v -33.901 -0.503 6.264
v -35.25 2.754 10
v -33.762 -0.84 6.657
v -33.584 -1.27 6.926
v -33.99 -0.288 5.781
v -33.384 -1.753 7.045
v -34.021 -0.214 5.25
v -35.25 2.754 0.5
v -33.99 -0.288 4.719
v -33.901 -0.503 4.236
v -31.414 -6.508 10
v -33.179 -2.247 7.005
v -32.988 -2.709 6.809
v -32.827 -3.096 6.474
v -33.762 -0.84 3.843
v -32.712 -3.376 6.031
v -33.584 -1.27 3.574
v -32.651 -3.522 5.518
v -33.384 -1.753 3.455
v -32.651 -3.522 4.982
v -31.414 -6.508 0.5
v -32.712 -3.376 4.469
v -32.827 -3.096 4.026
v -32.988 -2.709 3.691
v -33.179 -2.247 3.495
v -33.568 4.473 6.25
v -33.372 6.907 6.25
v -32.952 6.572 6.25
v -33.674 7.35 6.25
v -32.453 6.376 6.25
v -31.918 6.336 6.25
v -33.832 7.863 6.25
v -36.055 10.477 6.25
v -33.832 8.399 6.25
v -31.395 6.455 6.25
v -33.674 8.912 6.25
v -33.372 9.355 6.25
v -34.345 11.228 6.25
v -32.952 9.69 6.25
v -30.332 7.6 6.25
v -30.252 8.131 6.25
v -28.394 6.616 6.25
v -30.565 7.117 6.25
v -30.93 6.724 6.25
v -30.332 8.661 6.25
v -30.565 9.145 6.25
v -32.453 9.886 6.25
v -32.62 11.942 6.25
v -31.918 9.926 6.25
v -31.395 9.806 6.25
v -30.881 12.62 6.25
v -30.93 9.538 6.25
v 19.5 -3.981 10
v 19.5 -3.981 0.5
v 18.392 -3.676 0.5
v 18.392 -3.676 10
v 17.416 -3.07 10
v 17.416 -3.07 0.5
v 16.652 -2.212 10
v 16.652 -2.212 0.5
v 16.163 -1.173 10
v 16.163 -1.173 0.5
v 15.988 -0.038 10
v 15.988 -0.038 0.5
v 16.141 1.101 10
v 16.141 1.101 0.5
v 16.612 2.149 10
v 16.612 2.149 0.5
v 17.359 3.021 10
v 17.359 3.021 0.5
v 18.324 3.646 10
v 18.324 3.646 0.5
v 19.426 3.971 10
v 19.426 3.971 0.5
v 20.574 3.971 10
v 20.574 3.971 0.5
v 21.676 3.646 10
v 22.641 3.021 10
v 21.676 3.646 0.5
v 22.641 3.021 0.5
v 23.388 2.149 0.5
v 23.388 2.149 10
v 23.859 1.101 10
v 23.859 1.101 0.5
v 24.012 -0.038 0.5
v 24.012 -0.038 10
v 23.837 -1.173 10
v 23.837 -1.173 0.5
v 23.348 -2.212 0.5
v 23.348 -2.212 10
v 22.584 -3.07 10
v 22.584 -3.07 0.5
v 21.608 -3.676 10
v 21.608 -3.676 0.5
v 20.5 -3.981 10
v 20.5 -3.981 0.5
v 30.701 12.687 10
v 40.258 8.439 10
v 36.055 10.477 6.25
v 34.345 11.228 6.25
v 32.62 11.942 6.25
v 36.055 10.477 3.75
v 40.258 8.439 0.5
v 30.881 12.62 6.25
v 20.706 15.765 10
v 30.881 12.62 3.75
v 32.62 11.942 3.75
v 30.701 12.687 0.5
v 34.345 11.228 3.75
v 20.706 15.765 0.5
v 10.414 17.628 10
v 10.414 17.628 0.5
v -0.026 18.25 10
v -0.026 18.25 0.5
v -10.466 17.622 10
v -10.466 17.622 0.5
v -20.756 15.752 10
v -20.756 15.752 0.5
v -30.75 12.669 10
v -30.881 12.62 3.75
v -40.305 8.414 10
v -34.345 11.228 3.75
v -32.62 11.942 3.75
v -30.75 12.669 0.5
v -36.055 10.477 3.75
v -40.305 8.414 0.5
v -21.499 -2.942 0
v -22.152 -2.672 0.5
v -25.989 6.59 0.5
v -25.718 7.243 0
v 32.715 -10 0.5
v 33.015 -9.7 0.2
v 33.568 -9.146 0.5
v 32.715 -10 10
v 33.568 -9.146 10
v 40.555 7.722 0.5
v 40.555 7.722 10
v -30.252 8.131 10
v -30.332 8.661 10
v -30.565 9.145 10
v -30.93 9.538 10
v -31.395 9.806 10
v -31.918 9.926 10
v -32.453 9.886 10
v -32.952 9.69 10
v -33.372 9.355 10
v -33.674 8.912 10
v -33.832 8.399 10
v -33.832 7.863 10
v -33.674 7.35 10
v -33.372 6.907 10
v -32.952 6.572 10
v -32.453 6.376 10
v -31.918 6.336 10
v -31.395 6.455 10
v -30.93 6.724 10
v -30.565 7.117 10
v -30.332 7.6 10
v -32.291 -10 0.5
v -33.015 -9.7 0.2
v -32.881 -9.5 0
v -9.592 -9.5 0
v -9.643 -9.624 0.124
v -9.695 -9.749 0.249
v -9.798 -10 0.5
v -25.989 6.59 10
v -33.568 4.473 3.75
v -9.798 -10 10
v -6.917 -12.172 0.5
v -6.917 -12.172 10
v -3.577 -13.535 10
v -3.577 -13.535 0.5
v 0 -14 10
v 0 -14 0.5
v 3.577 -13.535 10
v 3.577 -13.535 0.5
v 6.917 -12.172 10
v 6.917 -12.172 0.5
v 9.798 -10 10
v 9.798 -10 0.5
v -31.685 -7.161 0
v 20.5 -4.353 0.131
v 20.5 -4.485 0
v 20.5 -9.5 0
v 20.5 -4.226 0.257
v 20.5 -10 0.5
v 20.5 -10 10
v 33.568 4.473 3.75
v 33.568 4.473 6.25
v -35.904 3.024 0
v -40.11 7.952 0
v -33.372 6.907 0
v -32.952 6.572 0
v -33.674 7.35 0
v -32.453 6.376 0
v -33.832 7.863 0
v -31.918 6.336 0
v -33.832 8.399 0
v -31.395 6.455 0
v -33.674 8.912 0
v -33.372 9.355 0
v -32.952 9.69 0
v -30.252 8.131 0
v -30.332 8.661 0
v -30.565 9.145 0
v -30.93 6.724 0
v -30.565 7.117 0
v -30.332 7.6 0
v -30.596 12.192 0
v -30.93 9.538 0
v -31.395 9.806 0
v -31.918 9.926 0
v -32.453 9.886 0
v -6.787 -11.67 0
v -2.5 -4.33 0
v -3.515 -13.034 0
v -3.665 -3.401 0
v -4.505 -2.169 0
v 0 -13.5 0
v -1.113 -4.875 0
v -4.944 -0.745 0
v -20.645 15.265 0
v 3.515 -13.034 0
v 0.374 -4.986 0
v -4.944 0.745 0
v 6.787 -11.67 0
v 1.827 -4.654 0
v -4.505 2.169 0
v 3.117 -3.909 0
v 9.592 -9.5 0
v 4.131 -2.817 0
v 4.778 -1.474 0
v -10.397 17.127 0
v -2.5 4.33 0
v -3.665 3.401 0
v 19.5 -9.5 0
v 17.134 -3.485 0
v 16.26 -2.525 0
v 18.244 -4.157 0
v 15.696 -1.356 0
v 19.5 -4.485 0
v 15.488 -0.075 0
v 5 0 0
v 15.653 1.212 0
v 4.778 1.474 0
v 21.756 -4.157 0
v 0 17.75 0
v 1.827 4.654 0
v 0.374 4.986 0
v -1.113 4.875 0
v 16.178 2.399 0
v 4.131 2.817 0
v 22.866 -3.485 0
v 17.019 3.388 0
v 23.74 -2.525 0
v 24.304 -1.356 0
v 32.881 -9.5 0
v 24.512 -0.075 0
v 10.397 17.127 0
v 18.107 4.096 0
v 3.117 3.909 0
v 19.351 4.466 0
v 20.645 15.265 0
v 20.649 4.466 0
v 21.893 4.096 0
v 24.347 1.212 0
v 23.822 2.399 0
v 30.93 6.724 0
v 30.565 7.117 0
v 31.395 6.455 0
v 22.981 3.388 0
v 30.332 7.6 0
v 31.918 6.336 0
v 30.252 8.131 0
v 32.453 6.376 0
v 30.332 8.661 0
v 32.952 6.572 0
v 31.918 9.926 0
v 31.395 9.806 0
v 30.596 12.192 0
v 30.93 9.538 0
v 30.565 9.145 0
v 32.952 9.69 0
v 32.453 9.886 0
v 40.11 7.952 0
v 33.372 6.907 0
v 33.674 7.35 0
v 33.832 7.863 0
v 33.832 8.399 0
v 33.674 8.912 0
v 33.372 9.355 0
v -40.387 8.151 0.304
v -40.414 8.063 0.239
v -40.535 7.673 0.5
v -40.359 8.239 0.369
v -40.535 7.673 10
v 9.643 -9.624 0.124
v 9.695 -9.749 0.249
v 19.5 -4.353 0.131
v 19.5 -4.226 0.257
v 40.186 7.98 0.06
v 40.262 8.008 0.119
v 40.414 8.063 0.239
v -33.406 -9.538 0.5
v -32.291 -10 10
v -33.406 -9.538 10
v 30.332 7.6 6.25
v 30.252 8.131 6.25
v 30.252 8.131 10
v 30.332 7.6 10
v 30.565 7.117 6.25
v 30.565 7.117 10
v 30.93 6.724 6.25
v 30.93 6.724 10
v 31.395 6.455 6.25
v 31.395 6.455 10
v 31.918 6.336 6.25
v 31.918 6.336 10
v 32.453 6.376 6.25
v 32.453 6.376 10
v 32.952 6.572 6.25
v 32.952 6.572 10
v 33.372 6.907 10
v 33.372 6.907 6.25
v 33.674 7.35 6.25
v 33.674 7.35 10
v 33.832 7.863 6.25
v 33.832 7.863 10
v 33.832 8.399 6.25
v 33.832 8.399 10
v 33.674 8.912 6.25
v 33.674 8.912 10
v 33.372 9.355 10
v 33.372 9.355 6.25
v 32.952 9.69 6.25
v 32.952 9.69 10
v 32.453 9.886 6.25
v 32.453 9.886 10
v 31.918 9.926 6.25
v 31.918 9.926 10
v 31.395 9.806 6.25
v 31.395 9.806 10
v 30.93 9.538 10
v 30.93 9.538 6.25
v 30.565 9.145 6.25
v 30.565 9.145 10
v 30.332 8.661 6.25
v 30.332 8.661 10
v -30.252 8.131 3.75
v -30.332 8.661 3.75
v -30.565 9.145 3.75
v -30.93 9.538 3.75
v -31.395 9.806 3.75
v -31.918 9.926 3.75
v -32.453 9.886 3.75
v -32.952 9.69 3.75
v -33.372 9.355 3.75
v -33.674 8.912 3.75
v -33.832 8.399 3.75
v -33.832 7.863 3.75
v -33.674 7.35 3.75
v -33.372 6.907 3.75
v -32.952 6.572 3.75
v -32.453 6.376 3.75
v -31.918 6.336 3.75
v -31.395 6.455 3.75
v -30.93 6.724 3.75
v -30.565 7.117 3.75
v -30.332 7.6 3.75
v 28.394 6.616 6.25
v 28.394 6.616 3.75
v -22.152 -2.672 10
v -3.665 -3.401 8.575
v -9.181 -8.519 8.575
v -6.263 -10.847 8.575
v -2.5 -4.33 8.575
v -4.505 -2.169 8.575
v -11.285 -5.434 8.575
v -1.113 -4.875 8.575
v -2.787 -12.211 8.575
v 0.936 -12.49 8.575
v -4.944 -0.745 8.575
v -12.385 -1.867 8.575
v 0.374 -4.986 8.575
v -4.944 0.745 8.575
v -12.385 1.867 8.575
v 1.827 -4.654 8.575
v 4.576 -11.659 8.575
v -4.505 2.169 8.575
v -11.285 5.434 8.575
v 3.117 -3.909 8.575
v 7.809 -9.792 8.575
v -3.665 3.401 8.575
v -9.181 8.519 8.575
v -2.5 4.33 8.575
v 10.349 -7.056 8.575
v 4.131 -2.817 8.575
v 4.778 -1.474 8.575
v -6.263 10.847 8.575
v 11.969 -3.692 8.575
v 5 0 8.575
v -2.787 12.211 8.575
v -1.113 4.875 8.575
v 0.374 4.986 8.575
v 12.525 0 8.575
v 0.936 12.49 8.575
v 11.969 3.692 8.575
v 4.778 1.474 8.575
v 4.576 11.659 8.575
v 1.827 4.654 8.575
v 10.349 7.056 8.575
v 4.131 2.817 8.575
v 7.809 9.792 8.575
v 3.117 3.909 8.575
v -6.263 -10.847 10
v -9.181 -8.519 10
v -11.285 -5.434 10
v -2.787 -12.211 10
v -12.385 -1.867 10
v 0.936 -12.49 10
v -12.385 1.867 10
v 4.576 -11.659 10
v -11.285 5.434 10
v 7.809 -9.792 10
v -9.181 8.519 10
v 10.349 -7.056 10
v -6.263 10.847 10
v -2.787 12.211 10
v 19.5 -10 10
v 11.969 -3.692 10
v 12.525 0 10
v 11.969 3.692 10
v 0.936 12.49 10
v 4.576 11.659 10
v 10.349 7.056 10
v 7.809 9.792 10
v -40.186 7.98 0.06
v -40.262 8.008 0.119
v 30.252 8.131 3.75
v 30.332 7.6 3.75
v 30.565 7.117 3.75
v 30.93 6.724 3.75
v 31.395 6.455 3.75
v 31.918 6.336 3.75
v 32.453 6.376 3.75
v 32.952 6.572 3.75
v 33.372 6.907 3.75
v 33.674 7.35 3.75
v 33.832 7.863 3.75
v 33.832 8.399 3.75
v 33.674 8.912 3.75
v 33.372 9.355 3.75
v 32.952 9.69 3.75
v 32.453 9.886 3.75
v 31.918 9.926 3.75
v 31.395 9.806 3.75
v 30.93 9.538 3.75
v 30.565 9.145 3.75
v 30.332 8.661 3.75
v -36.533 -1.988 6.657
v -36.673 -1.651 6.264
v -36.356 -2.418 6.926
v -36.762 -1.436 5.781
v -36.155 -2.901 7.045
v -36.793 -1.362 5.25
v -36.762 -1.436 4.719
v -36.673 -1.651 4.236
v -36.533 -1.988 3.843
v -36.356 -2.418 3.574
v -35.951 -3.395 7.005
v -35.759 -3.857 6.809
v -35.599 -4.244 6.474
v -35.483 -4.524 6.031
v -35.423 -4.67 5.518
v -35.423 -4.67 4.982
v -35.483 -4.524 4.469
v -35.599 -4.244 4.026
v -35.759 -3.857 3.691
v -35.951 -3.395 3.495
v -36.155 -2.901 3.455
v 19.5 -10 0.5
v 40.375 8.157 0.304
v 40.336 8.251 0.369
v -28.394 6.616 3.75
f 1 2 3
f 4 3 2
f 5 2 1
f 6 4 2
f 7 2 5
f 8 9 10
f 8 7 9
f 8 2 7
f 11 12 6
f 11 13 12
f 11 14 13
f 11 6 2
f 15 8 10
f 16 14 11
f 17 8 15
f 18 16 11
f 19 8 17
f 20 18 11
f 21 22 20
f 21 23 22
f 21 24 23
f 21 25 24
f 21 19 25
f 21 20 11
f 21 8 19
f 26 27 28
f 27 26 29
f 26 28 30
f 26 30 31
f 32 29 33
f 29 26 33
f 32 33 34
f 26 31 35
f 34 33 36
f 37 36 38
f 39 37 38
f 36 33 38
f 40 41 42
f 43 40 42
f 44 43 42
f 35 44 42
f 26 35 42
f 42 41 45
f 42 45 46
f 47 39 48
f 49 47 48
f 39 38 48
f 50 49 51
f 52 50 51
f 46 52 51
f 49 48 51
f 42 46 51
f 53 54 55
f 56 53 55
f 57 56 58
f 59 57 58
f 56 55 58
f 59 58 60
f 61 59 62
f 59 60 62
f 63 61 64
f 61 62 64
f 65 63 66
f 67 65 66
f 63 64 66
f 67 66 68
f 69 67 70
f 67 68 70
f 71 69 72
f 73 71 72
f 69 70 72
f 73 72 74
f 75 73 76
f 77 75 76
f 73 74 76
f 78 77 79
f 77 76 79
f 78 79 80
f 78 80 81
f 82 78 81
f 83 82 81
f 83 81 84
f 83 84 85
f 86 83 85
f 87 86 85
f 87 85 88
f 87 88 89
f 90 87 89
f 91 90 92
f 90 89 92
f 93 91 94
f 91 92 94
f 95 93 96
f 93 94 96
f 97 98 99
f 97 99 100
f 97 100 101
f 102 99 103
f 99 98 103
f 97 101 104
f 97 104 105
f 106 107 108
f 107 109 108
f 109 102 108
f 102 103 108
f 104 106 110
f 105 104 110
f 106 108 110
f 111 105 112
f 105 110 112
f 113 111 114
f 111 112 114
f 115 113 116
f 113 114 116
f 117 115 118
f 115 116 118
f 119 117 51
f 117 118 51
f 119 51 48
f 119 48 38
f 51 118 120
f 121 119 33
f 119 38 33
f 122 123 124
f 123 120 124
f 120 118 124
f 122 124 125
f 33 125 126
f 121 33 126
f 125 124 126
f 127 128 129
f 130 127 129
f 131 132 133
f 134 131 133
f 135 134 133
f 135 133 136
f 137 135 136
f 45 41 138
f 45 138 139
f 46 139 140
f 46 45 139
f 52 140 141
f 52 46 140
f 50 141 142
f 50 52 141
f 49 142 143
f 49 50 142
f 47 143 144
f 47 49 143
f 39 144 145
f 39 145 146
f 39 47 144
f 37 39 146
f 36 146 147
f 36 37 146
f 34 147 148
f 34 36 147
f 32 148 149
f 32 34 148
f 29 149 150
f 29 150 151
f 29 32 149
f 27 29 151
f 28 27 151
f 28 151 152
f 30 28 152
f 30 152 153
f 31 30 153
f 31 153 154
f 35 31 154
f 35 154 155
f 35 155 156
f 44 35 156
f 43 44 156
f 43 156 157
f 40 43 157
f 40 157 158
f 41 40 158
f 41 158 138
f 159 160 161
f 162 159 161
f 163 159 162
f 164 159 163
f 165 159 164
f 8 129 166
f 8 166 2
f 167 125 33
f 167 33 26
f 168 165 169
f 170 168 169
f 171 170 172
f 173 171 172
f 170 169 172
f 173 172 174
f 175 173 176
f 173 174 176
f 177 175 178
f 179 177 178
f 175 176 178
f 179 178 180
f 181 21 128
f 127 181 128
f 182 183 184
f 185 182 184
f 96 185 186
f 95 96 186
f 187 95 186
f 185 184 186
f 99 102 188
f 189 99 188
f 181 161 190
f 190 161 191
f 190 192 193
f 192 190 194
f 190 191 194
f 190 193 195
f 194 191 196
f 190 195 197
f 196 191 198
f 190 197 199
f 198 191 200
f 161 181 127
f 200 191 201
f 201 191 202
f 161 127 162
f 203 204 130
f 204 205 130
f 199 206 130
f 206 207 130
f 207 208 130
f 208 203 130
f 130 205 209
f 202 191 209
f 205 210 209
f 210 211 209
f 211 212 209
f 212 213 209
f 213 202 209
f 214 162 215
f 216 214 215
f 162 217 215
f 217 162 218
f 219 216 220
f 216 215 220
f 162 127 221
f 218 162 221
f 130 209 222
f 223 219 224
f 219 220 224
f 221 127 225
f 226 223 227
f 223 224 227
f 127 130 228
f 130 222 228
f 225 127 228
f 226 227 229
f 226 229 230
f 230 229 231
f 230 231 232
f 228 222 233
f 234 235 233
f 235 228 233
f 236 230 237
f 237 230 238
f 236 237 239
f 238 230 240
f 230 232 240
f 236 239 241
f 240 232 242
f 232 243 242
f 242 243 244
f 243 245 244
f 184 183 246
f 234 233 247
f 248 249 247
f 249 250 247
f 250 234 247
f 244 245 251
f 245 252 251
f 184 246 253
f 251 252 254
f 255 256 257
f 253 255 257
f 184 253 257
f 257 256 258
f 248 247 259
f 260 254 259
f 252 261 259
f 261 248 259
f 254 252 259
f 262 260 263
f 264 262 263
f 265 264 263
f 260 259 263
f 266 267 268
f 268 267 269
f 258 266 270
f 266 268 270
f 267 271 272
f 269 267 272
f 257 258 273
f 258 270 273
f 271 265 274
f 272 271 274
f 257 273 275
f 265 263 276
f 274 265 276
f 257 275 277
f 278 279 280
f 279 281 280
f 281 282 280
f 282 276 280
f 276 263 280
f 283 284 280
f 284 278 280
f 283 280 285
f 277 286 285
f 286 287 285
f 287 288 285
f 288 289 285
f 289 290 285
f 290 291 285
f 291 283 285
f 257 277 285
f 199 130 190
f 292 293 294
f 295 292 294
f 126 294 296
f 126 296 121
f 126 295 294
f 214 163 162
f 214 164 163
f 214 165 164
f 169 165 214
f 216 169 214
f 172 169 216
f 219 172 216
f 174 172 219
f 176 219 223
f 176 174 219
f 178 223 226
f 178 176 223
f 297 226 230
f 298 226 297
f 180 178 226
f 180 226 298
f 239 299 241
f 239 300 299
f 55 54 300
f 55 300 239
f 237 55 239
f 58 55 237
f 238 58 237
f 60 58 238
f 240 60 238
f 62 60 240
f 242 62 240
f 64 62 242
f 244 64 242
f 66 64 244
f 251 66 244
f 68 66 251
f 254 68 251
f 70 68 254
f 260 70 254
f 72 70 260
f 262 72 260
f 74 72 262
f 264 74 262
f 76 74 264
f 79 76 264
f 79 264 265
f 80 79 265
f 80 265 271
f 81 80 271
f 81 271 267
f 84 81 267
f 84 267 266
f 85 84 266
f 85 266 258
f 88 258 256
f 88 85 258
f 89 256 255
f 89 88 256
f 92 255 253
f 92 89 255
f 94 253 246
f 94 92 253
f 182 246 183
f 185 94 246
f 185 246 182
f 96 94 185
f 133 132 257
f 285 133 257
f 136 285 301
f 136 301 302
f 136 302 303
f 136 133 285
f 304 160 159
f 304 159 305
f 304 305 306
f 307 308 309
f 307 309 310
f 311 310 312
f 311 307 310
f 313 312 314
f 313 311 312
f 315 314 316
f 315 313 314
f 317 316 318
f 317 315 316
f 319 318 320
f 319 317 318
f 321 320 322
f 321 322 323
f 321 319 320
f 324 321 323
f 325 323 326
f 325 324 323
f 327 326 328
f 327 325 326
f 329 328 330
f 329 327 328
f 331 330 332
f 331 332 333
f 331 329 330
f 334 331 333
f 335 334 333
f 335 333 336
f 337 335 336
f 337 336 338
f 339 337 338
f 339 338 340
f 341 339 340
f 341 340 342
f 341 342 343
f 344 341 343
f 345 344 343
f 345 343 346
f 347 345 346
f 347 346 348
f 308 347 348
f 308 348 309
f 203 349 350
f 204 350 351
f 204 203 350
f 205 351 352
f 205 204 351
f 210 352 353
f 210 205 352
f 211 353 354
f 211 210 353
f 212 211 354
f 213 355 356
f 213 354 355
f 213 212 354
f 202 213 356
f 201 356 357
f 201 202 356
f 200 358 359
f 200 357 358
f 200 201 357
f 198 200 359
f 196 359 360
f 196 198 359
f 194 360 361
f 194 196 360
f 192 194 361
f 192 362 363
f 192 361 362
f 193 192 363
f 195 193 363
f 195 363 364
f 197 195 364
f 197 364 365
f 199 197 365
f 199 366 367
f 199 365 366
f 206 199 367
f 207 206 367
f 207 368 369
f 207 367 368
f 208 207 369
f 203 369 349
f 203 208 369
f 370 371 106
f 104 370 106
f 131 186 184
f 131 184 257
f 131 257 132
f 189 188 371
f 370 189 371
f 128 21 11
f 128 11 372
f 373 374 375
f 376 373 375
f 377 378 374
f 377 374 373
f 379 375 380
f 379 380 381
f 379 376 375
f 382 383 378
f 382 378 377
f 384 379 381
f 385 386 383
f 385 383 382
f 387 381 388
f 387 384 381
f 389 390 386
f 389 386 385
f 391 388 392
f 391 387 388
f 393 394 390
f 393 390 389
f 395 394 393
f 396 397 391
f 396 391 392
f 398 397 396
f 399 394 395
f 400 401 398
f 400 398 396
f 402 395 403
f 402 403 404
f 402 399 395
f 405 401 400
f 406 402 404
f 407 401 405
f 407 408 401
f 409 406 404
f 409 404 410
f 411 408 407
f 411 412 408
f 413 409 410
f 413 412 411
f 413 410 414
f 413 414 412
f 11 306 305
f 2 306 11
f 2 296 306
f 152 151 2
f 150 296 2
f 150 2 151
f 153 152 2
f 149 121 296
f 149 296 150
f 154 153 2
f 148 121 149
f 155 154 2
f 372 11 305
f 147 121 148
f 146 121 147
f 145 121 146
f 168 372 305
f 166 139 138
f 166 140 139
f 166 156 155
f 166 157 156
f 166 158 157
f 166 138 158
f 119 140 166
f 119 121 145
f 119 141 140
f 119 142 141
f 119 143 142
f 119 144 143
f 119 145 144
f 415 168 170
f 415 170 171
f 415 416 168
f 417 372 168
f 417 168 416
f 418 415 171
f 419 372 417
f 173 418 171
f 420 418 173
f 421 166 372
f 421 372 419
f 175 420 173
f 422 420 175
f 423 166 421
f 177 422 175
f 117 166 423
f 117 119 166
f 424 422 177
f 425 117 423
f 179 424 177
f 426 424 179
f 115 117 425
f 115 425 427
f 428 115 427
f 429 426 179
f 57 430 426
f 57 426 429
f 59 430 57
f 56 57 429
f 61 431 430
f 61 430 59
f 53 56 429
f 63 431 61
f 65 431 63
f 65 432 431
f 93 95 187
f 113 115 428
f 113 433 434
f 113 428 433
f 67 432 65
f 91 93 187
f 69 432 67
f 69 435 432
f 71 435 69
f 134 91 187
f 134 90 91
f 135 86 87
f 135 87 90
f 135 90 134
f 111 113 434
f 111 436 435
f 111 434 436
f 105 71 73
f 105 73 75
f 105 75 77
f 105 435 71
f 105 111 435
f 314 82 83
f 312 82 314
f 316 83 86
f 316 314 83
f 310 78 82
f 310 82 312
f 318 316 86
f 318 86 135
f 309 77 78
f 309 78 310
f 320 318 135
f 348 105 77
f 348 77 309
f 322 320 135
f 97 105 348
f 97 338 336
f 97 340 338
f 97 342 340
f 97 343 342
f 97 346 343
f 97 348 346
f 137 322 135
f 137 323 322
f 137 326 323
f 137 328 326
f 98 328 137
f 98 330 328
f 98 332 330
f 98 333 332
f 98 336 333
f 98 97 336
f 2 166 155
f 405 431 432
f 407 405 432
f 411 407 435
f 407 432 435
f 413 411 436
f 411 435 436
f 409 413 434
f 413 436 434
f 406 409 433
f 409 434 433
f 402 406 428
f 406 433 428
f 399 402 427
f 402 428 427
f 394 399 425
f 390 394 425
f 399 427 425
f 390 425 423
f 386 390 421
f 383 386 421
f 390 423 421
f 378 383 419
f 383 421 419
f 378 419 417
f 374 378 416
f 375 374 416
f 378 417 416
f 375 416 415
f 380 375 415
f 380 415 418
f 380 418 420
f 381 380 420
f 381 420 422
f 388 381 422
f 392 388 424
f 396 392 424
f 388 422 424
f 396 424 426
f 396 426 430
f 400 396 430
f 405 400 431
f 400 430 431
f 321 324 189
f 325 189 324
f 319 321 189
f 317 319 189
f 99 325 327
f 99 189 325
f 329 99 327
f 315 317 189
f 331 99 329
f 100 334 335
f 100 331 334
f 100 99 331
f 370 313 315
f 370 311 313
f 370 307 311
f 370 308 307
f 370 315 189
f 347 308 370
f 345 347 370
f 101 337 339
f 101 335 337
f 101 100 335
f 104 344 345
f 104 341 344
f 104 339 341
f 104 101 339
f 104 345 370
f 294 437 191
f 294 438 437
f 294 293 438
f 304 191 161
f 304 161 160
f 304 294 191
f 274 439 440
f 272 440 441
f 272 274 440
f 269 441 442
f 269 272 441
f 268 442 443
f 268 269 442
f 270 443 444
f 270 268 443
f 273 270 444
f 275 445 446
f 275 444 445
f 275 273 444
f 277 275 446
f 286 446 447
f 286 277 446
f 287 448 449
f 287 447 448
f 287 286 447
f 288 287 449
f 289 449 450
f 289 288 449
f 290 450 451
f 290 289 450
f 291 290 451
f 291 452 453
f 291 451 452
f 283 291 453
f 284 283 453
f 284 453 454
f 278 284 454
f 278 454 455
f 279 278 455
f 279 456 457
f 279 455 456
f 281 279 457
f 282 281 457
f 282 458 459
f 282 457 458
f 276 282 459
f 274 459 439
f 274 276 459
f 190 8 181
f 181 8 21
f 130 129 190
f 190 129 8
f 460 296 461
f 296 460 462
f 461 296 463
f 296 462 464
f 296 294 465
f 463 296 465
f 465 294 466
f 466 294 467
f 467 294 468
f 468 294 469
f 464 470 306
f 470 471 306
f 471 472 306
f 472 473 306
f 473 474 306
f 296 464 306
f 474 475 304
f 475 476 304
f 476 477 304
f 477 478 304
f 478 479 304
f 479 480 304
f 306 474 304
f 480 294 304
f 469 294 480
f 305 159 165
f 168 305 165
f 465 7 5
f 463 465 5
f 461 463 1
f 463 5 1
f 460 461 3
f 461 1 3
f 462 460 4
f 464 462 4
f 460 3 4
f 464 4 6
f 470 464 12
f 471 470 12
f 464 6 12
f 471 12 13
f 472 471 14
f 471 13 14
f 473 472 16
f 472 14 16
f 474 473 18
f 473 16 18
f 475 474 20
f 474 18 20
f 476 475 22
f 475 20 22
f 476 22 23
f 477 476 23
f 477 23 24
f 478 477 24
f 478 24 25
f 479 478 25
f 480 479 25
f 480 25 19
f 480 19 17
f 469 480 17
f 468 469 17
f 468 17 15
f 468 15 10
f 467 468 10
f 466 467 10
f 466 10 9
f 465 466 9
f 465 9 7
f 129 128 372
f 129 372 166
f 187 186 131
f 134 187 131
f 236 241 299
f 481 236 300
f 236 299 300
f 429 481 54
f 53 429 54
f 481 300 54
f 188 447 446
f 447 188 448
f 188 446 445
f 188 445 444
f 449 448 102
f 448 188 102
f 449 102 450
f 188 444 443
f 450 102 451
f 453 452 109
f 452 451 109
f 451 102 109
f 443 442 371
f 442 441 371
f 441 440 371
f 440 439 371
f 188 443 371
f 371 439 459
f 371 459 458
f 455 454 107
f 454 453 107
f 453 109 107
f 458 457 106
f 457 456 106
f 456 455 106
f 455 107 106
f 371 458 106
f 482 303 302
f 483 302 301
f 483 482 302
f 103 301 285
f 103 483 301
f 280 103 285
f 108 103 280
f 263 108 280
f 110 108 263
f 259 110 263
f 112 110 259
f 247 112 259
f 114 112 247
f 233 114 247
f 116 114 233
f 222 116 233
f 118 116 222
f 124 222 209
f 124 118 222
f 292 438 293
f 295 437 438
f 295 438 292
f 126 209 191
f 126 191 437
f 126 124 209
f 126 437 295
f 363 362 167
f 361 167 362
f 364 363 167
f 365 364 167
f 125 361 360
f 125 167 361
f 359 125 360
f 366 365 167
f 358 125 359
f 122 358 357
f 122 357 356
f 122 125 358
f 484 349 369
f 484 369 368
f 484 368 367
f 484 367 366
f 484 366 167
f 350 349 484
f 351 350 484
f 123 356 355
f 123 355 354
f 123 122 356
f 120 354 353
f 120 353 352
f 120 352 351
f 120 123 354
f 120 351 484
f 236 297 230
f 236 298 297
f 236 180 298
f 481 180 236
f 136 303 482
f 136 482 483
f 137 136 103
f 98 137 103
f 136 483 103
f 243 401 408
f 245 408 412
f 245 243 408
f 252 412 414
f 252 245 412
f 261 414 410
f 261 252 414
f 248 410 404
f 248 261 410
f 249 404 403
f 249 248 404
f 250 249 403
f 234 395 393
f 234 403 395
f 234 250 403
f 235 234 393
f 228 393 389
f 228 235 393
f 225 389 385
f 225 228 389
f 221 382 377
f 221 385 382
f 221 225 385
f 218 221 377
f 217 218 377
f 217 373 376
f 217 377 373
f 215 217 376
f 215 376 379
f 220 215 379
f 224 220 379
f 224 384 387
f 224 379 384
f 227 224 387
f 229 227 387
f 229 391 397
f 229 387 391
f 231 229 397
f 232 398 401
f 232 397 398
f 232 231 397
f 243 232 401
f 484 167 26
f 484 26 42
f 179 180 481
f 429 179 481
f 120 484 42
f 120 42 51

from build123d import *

# Parameters (mm, degrees)
SKETCH1_R           = 5
SKETCH1_R_2         = 1.8
BOSS_EXTRUDE1_DEPTH = 10
SKETCH2_R           = 12.525
CUT_EXTRUDE1_DEPTH  = 1.425
CHAMFER1_SIZE       = 0.5
CUT_EXTRUDE2_DEPTH  = 2.5
CHAMFER2_SIZE       = 0.5
SKETCH4_R           = 1.8
CUT_EXTRUDE3_DEPTH  = 10
CHAMFER3_SIZE       = 0.5
CHAMFER3_SIZE_2     = 0.923879533
CHAMFER3_SIZE_3     = 0.552958444


with BuildPart() as part:
    # Sketch1 → Boss-Extrude1 (new body)
    with BuildSketch(Plane.XY):
        with BuildLine():
            Line((-40.746699048, 8.183561953), (-33.214821075, -10))
            Line((-33.214821075, -10), (-9.797958971, -10))
            ThreePointArc((-9.797958971, -10), (0, -14), (9.797958971, -10))
            Line((9.797958971, -10), (19.5, -10))
            Line((19.5, -10), (19.5, -3.981225471))
            ThreePointArc((19.5, -3.981225471), (20, 4.0125), (20.5, -3.981225471))
            Line((20.5, -3.981225471), (20.5, -10))
            Line((20.5, -10), (33.214821075, -10))
            Line((33.214821075, -10), (40.746699048, 8.183561953))
            ThreePointArc((40.746699048, 8.183561953), (0, 18.25), (-40.746699048, 8.183561953))
        make_face()
        Circle(SKETCH1_R, mode=Mode.SUBTRACT)
        with Locations((-32.052211881, 8.130884627)):
            Circle(SKETCH1_R_2, mode=Mode.SUBTRACT)
        with Locations(Location((32.052211881, 8.130884627, 0), (0, 0, 180))):
            Circle(SKETCH1_R_2, mode=Mode.SUBTRACT)
        Polygon((-25.988511975, 6.5901118), (-35.250404289, 2.75371039), (-31.414002879, -6.508181923), (-22.152110566, -2.671780514), align=None, mode=Mode.SUBTRACT)
    extrude(amount=BOSS_EXTRUDE1_DEPTH)

    # Sketch2 → Cut-Extrude1 (cut)
    with BuildSketch(Plane.XY.offset(10)):
        Circle(SKETCH2_R)
    extrude(amount=-CUT_EXTRUDE1_DEPTH, mode=Mode.SUBTRACT)

    # Chamfer1
    chamfer1_edges = [part.edges().sort_by_distance(p)[0] for p in [
        (20, 4.0125, 0),
        (-24.070311271, 1.959165643, 0),
        (-30.619458132, 4.671911095, 0),
        (-33.332203584, -1.877235766, 0),
        (-26.783056723, -4.589981218, 0),
    ]]
    chamfer(chamfer1_edges, length=CHAMFER1_SIZE)

    # Sketch3 → Cut-Extrude2 (cut)
    with BuildSketch(Plane.XY.offset(3.75)):
        Polygon((-37.076762037, 12.944469155), (-33.567560961, 4.472508325), (-28.393835579, 6.615535546), (-31.903036655, 15.087496376), align=None)
        Polygon((37.076762037, 12.944469155), (33.567560961, 4.472508325), (28.393835579, 6.615535546), (31.903036655, 15.087496376), align=None)
    extrude(amount=CUT_EXTRUDE2_DEPTH, mode=Mode.SUBTRACT)

    # Chamfer2
    chamfer2_edges = [part.edges().sort_by_distance(p)[0] for p in [
        (14.648979486, -10, 0),
        (0, -14, 0),
        (-21.506390023, -10, 0),
        (-36.980760062, -0.908219024, 0),
        (0, 18.25, 0),
        (36.980760062, -0.908219024, 0),
        (26.857410538, -10, 0),
    ]]
    chamfer(chamfer2_edges, length=CHAMFER2_SIZE)

    # Sketch4 → Cut-Extrude3 (cut)
    with BuildSketch(Plane(origin=(-29.114518455, -12.059628406, 0), x_dir=(0, 0, -1), z_dir=(0.9238795325112882, 0.38268343236508634, 0))):
        with Locations(Location((-5.25, 11.021342374, 0), (0, 0, 90))):
            Circle(SKETCH4_R)
    extrude(amount=-CUT_EXTRUDE3_DEPTH, mode=Mode.SUBTRACT)

    # Chamfer3
    # the kernel refuses this chamfer: 0.923879533, 0.552958444, 0.5 mm, written as the material it takes off along each edge
    with BuildSketch(Plane(origin=(40.746699048, 8.183561953, -0.920037939), x_dir=(-0.38268343236508906, -0.923879532511287, 0), z_dir=(0, 0, 1))) as chamfer3_piece_1:
        with BuildLine():
            Line((CHAMFER3_SIZE, 0), (-0.048717445, -0.548717445))
            ThreePointArc((-0.048717445, -0.548717445), (-0.025540103, -0.282767493), (0, 0))
            Line((0, 0), (CHAMFER3_SIZE, 0))
        make_face()
    extrude(amount=12.340075878, mode=Mode.SUBTRACT)
    with BuildSketch(Plane(origin=(33.214821075, -10, -1.895315111), x_dir=(-1, 0, 0), z_dir=(0, 0, 1))) as chamfer3_piece_2:
        Polygon((CHAMFER3_SIZE, 0), (-CHAMFER3_SIZE_2 * 0.382683432163, -CHAMFER3_SIZE_2 * 0.923879532023), (0, 0), align=None)
    extrude(amount=14.290630221, mode=Mode.SUBTRACT)
    with BuildSketch(Plane(origin=(-33.214821075, -10, -1.895315111), x_dir=(1, 0, 0), z_dir=(0, 0, 1))) as chamfer3_piece_3:
        Polygon((CHAMFER3_SIZE_2, 0), (-CHAMFER3_SIZE * 0.382683432365, CHAMFER3_SIZE * 0.923879532511), (0, 0), align=None)
    extrude(amount=14.290630221, mode=Mode.SUBTRACT)
    with BuildSketch(Plane(origin=(-40.746699048, 8.183561953, -0.925350902), x_dir=(0.38268343236508684, -0.9238795325112881, 0), z_dir=(0, 0, 1))) as chamfer3_piece_4:
        with BuildLine():
            Line((CHAMFER3_SIZE_3, 0), (-0.04424113, 0.496614821))
            ThreePointArc((-0.04424113, 0.496614821), (-0.0231658, 0.256042208), (0, 0))
            Line((0, 0), (CHAMFER3_SIZE_3, 0))
        make_face()
    extrude(amount=12.350701805, mode=Mode.SUBTRACT)


solid = part.part
